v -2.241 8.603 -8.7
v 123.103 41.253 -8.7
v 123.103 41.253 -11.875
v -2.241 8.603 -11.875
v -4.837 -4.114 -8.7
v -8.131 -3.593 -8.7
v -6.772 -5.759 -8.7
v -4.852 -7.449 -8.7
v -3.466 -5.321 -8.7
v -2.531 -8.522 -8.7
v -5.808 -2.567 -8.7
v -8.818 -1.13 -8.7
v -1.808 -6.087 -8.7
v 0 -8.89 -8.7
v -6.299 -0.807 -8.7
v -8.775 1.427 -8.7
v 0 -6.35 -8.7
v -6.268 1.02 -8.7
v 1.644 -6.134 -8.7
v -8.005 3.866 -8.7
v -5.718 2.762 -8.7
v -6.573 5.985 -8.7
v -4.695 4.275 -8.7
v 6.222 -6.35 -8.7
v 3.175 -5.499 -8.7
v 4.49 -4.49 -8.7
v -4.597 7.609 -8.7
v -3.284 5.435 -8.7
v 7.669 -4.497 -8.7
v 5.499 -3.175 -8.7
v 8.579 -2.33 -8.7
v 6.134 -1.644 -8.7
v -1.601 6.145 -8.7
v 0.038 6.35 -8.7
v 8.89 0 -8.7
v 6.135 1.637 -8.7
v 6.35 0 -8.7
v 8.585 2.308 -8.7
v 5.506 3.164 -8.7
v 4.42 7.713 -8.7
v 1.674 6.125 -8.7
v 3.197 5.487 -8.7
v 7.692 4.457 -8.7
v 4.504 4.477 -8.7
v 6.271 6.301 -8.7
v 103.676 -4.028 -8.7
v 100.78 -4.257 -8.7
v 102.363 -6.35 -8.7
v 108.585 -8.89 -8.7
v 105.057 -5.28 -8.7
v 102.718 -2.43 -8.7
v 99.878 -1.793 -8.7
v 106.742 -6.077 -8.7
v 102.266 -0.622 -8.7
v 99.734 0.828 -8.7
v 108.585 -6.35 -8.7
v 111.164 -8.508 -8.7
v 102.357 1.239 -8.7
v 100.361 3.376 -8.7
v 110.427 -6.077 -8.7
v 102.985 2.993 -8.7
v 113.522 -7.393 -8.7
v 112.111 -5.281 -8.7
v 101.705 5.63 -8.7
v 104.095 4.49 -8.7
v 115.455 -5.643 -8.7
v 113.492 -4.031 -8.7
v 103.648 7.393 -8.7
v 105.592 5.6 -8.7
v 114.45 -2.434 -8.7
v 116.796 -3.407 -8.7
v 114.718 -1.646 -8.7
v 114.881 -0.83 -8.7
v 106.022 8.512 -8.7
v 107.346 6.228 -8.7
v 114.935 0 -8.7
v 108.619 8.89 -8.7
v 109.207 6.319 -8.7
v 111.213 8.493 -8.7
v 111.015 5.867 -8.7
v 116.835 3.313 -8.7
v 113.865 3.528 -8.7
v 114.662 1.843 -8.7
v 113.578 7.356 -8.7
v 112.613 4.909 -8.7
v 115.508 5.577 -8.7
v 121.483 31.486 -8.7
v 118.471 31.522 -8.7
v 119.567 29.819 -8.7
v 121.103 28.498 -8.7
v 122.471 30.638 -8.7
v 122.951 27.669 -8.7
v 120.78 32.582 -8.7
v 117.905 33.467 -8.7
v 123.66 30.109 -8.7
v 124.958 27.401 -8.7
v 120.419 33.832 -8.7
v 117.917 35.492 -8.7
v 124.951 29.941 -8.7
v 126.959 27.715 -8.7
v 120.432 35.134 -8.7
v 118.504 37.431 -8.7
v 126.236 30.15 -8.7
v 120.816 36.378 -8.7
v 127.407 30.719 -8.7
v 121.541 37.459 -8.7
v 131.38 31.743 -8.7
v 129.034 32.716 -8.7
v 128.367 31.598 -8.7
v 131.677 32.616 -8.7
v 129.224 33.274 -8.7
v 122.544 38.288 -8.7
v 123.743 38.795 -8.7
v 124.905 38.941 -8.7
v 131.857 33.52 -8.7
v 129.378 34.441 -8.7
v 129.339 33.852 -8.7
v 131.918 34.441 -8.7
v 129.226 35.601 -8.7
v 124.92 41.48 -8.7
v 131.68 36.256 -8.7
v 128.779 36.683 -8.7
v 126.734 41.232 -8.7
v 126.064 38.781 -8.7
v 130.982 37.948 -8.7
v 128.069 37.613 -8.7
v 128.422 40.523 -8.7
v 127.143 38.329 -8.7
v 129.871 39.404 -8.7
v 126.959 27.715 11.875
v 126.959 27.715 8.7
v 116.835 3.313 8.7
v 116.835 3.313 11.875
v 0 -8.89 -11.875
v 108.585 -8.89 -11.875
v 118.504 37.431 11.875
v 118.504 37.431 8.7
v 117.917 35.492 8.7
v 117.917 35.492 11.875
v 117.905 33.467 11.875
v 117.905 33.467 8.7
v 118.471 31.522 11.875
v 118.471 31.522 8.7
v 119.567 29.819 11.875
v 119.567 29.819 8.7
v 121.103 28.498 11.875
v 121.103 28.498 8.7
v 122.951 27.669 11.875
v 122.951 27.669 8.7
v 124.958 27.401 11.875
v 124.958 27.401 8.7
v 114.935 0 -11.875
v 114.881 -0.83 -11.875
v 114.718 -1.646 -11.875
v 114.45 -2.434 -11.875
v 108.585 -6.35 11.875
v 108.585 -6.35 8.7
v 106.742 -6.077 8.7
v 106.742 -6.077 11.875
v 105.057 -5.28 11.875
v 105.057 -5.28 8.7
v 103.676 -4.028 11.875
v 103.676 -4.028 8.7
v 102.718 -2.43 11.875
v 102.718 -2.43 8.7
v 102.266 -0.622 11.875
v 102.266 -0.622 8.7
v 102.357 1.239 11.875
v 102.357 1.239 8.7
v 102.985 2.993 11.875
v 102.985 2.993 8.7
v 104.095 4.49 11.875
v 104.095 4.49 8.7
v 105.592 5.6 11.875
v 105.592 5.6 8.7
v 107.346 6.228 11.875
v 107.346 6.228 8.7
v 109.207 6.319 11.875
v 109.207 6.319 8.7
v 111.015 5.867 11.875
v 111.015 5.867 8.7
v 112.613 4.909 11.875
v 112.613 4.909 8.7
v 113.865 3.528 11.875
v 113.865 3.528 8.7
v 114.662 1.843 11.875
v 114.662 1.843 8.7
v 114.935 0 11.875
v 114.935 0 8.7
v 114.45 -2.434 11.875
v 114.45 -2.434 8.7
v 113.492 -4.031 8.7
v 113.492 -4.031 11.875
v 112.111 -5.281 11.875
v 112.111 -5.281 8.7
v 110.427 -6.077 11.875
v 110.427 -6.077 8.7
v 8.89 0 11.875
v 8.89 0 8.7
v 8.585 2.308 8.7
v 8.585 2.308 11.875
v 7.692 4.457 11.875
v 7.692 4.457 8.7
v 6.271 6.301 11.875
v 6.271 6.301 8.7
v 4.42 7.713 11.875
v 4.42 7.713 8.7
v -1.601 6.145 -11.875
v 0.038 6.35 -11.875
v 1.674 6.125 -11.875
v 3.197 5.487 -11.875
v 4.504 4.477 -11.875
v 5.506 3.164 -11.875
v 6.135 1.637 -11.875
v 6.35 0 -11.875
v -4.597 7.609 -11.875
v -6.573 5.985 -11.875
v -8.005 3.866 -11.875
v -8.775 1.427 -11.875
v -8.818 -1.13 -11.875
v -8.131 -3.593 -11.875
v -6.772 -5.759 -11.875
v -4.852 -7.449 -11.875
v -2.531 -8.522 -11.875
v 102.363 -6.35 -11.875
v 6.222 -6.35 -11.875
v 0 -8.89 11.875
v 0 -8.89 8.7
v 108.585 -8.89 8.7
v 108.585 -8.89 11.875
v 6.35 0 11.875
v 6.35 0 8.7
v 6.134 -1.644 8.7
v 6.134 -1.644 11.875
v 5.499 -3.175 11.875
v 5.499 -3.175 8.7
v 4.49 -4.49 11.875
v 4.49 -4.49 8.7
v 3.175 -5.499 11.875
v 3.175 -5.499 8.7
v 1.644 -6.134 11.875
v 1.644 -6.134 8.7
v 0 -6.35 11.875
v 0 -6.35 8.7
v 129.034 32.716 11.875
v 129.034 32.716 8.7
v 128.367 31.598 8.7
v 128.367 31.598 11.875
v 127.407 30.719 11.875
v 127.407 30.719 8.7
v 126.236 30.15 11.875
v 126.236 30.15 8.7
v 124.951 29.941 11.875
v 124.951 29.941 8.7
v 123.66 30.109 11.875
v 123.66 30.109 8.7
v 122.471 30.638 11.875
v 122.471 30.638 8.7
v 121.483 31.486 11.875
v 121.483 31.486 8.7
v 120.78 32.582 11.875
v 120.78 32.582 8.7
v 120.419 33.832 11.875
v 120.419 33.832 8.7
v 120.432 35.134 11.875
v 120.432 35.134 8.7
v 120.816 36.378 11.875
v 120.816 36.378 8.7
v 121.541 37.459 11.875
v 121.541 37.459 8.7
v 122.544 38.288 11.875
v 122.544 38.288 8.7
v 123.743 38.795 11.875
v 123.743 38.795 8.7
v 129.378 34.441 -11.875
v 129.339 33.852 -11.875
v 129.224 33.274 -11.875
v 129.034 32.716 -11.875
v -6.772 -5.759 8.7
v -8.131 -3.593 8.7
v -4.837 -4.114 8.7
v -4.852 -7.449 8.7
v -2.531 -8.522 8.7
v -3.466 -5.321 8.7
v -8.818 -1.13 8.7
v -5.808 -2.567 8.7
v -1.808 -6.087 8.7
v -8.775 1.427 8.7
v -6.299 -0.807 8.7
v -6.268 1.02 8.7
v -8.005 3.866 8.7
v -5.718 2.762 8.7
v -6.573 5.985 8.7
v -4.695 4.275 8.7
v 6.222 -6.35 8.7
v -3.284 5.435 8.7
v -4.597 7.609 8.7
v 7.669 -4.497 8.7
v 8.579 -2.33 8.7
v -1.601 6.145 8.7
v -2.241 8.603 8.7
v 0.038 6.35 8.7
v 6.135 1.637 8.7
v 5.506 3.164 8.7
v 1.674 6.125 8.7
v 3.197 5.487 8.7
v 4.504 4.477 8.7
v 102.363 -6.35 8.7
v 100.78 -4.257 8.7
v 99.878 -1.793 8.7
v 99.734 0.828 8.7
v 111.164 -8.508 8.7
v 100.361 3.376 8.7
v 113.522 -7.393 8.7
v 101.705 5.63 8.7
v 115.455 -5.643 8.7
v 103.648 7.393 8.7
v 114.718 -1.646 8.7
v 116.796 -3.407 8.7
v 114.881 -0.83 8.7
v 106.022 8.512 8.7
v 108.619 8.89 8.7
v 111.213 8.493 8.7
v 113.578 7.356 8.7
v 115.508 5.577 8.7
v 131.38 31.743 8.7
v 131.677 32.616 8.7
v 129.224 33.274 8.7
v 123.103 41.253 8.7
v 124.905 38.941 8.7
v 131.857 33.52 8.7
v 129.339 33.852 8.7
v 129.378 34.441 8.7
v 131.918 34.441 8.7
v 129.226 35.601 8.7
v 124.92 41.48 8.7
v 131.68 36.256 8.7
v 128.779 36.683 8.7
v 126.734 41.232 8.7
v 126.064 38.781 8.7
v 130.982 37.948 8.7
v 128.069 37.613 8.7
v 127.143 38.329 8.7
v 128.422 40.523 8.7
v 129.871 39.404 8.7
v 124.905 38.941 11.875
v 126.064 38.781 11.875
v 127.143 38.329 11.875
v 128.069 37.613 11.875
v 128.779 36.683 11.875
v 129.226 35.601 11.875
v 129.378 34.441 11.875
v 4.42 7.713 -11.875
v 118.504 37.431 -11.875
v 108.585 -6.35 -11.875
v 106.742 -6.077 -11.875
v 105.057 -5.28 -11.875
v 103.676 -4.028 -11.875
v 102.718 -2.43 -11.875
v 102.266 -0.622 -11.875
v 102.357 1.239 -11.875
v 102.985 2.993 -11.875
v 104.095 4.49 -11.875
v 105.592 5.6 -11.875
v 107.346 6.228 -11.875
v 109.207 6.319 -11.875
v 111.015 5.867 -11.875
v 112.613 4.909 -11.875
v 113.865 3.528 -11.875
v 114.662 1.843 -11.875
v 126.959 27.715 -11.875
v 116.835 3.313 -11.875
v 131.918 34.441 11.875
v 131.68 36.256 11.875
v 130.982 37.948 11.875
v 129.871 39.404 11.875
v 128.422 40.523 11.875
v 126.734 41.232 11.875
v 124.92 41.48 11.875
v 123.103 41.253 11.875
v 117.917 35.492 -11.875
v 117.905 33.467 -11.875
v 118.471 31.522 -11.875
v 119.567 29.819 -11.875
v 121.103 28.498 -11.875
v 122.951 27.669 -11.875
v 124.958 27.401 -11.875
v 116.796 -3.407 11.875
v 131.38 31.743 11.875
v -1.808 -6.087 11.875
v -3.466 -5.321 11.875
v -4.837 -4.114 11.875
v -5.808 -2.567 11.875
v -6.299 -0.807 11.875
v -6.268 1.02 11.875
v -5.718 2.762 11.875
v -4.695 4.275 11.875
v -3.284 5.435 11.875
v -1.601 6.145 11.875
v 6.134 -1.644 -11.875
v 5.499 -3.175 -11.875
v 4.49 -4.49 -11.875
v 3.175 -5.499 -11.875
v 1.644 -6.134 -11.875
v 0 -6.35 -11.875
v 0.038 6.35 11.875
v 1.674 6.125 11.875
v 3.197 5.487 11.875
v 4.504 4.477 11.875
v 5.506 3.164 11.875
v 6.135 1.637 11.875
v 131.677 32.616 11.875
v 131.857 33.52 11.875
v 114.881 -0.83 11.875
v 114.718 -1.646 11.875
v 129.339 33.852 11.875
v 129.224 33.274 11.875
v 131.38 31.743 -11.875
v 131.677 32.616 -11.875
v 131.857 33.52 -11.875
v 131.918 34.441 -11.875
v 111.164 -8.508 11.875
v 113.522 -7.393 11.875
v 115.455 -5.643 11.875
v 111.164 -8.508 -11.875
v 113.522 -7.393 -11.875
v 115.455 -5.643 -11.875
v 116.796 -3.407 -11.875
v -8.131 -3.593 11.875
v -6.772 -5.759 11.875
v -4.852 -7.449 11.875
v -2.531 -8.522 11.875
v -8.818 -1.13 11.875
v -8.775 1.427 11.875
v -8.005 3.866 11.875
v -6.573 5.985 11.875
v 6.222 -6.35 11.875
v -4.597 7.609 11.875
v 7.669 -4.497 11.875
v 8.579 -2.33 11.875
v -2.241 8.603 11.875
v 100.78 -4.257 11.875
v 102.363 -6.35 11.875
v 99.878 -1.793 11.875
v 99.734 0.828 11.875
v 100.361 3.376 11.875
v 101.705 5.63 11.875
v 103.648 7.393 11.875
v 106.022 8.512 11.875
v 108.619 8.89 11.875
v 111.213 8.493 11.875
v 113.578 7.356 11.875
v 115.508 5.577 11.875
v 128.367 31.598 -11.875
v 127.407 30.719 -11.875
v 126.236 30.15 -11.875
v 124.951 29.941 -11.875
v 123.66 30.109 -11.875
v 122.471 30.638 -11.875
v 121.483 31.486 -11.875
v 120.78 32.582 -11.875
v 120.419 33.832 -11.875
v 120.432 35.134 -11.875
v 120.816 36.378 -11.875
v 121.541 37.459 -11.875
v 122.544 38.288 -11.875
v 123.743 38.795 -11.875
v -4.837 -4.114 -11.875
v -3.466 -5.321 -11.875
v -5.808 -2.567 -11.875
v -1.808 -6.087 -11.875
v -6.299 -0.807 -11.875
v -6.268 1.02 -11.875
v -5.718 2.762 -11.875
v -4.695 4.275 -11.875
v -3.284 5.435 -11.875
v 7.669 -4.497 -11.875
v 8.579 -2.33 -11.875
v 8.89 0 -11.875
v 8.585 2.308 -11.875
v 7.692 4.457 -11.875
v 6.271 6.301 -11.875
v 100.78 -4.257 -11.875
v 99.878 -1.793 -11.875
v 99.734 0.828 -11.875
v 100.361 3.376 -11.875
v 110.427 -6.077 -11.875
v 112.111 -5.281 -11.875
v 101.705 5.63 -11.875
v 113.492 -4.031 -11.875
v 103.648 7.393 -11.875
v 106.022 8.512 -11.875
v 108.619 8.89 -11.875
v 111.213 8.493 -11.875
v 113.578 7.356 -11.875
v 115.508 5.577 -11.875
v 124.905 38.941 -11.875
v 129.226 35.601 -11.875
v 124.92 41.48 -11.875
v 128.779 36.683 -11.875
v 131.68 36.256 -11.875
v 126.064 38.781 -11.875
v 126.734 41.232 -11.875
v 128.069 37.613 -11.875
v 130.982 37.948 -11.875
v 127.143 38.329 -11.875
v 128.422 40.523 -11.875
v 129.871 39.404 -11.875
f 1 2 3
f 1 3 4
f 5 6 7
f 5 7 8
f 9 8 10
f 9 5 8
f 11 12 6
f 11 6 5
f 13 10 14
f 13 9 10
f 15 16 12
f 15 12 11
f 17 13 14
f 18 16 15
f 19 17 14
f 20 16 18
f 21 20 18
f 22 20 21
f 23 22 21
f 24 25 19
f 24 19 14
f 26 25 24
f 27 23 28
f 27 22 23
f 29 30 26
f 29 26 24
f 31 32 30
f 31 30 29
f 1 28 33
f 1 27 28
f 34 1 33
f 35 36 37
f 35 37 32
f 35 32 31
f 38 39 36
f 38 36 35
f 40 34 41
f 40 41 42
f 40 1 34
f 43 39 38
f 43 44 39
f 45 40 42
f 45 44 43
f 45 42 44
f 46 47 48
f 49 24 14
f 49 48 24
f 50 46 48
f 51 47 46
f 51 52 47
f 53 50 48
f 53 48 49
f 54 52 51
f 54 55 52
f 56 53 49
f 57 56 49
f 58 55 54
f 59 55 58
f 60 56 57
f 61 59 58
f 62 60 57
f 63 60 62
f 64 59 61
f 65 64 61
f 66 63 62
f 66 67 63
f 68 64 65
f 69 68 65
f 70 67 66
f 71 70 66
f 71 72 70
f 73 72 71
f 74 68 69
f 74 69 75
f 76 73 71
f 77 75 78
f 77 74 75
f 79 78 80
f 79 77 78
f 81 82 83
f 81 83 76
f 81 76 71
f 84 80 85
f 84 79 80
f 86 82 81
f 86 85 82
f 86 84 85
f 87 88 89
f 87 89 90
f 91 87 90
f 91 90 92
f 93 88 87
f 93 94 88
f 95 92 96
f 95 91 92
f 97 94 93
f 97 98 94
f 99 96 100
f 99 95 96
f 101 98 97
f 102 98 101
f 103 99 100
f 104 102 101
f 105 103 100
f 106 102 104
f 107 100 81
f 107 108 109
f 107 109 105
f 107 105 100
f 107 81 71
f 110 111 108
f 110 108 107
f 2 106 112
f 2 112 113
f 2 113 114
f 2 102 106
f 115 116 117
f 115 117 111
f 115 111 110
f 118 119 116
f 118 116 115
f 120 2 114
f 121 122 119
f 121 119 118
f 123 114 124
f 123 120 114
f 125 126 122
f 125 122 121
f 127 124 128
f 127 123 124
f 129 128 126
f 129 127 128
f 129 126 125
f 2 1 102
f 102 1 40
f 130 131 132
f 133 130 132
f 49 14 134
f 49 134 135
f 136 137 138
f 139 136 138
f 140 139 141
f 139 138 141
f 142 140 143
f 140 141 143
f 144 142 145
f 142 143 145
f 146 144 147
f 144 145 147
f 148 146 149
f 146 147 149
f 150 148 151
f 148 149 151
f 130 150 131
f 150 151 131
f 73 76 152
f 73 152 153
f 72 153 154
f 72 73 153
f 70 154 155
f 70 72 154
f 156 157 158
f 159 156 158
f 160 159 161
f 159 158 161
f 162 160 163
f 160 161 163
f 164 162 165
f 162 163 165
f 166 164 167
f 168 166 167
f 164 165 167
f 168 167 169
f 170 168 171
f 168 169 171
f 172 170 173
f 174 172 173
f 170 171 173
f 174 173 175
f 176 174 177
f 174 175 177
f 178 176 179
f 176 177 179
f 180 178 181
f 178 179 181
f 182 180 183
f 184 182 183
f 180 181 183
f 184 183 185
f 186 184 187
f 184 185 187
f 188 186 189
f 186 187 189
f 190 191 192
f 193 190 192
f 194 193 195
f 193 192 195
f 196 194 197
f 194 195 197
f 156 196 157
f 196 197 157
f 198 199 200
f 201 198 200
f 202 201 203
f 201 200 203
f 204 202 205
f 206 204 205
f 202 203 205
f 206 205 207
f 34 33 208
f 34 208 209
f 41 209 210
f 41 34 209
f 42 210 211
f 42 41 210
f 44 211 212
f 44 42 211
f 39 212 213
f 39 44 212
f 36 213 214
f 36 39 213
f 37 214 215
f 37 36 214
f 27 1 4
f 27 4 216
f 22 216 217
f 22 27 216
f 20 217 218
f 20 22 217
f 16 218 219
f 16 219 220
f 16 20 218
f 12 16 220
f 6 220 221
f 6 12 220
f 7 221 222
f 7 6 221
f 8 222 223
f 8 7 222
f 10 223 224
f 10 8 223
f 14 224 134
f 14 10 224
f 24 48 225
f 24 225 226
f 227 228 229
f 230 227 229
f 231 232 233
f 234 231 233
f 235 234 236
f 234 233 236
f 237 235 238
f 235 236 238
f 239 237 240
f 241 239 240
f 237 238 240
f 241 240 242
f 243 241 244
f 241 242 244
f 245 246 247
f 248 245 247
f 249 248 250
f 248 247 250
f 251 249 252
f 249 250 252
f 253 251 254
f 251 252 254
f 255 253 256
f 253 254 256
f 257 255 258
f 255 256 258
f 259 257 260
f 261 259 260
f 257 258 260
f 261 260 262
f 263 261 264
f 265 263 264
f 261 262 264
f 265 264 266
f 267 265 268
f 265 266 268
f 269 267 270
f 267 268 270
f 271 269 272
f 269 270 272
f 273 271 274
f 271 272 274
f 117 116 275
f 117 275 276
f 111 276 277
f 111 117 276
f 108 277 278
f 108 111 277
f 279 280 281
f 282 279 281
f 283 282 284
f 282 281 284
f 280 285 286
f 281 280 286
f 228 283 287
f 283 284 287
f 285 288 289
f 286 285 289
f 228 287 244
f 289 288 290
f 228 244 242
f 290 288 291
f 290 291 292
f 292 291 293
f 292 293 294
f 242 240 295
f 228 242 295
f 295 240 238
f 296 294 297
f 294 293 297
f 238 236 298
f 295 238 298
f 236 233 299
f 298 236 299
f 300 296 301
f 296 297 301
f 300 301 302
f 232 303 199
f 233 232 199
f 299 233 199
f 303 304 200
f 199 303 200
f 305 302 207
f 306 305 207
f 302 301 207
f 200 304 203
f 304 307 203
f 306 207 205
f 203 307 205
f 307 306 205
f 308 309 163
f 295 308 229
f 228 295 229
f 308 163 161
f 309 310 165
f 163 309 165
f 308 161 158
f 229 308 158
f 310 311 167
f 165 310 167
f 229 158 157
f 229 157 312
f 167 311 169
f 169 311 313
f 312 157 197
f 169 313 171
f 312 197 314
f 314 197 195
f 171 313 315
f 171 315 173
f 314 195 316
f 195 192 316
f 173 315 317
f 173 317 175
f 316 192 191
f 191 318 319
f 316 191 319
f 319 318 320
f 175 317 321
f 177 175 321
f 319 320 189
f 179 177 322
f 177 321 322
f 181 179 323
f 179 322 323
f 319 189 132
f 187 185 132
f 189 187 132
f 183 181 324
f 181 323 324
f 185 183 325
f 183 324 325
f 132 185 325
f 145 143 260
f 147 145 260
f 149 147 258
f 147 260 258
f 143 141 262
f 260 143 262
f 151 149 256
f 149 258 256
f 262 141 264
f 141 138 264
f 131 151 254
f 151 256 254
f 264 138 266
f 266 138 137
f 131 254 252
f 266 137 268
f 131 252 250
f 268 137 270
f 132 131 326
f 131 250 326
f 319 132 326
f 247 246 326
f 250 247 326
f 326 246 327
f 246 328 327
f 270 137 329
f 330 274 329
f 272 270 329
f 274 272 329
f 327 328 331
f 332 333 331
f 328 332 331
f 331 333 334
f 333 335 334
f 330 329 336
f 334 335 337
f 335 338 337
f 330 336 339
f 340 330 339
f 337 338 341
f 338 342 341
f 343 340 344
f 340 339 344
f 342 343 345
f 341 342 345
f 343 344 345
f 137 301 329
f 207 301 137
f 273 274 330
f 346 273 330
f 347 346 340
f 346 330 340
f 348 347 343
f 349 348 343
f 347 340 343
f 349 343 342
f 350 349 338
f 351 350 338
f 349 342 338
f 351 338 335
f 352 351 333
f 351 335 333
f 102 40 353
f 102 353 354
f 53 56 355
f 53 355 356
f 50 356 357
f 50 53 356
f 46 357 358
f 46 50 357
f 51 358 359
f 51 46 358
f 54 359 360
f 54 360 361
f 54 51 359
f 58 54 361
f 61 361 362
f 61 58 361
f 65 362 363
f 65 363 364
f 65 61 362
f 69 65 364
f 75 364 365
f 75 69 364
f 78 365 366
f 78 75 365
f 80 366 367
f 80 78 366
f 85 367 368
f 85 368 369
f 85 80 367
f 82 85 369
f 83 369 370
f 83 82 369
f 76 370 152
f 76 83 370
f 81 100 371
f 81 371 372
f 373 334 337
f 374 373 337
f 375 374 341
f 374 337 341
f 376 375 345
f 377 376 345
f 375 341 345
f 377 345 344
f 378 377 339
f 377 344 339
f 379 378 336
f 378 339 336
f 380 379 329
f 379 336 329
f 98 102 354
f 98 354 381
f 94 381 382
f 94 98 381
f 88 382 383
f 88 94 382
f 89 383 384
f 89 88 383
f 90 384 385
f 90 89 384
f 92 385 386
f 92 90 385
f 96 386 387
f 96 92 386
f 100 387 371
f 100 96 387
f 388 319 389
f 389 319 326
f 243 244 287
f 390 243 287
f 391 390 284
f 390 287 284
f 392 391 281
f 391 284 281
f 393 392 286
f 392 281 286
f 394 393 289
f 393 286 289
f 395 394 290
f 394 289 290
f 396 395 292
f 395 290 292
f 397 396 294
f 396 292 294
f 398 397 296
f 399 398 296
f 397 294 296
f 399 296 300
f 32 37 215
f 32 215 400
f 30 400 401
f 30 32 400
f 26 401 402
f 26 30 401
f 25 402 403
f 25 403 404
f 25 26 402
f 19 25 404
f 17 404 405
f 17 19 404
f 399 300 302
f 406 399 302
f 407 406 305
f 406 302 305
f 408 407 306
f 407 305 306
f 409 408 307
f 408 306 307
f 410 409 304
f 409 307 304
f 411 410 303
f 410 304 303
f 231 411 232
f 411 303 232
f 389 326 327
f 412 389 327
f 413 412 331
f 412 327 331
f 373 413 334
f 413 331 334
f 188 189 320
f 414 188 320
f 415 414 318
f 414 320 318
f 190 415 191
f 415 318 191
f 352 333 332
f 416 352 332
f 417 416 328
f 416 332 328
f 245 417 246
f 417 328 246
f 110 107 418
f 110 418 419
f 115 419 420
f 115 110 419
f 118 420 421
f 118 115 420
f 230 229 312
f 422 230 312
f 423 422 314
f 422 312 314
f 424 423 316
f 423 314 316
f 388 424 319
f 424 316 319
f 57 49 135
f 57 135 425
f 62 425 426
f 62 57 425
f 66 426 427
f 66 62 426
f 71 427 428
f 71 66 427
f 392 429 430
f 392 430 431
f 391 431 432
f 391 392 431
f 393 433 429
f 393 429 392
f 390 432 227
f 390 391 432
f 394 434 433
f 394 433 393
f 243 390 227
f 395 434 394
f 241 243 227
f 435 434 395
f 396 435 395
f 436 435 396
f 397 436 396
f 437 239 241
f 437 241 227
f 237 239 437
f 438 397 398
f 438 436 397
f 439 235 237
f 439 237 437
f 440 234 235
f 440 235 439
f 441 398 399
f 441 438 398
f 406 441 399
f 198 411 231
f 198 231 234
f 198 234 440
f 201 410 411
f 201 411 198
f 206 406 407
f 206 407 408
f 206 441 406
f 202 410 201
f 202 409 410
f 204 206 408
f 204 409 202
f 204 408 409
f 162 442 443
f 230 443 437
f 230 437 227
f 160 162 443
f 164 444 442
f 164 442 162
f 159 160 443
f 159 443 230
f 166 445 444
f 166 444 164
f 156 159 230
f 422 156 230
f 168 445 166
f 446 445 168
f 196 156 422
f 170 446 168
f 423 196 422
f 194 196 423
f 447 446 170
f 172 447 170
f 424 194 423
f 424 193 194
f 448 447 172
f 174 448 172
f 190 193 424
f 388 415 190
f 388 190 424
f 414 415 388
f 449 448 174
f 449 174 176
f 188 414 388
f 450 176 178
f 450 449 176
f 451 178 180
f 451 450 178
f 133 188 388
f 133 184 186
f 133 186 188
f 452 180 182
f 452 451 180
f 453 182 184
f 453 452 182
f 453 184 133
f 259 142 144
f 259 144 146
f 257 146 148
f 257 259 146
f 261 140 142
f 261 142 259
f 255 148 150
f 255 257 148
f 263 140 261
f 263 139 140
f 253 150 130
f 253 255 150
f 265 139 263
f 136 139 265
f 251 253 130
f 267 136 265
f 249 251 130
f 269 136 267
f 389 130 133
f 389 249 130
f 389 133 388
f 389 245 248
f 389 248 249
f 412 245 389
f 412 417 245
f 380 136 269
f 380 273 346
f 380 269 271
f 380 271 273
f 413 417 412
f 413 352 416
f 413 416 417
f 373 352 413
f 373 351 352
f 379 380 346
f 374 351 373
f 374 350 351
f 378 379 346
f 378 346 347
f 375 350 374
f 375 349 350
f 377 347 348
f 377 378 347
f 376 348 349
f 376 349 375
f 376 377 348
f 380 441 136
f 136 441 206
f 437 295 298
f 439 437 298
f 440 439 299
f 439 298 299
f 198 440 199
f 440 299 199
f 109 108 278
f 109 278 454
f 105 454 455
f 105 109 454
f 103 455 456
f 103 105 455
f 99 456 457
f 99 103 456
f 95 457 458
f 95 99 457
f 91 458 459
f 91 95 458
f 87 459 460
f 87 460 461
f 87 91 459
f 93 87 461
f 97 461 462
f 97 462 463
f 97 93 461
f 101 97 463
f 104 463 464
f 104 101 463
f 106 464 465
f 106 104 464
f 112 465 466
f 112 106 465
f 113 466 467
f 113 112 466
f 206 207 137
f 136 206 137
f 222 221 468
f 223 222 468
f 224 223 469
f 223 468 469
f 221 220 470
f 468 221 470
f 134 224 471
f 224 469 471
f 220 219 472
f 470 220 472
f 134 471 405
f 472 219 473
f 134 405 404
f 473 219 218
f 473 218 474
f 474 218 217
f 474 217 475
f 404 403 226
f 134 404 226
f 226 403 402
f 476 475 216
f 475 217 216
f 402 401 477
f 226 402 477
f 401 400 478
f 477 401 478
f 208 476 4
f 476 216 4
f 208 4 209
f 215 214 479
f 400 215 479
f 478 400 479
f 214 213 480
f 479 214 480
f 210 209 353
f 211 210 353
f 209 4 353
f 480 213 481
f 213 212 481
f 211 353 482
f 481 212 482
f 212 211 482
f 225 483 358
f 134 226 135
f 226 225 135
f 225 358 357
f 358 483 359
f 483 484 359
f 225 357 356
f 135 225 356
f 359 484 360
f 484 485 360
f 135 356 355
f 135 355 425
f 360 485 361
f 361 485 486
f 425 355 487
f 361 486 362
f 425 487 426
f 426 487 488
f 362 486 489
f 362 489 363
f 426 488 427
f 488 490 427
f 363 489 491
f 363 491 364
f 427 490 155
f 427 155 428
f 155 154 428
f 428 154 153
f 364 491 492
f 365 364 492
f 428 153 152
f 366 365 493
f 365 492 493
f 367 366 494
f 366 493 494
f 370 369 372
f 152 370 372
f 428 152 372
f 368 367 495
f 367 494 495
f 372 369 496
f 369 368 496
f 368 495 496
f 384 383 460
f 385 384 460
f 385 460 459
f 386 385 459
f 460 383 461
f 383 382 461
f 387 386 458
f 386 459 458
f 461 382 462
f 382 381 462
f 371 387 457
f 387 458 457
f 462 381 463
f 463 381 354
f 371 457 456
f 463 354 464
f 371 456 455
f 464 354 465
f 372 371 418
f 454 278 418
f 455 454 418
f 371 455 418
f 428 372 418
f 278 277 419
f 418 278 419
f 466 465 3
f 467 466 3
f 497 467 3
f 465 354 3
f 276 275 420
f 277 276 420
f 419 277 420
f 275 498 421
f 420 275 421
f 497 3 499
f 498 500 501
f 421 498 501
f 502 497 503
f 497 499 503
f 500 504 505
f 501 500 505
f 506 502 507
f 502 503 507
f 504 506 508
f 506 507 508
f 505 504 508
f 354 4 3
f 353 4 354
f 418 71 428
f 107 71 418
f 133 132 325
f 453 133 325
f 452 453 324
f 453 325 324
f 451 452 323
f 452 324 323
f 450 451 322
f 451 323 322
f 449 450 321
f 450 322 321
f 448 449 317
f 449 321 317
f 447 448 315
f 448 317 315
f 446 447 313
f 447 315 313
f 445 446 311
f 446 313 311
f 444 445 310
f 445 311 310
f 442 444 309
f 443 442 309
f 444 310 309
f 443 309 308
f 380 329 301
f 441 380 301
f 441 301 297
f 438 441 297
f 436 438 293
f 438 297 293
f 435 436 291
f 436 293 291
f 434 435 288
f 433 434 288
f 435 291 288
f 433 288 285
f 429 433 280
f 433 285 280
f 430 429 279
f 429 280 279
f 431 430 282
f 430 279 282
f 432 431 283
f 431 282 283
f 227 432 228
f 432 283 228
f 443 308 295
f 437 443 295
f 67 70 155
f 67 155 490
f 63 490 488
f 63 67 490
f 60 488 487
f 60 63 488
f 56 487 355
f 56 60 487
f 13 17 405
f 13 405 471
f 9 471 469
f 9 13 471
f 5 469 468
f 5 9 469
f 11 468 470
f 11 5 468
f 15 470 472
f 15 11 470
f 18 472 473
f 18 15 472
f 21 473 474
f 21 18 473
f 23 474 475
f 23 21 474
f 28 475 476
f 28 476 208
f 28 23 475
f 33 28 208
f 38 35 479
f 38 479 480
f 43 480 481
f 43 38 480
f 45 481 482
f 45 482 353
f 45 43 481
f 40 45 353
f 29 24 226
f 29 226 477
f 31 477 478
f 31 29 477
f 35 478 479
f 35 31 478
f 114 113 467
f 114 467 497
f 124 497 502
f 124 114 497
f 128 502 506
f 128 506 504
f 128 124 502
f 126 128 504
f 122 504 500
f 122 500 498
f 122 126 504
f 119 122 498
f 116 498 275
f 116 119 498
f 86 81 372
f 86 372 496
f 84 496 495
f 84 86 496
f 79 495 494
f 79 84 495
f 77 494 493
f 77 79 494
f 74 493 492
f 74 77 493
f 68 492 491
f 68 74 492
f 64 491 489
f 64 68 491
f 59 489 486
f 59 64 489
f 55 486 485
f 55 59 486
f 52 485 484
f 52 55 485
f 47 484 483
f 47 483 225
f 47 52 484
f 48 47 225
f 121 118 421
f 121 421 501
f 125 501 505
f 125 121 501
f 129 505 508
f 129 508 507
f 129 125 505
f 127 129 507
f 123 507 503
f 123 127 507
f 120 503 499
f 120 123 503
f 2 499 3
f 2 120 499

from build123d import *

# Parameters (mm, degrees)
BOSS_EXTRUDE1_START = 8.6995
BOSS_EXTRUDE1_DEPTH = 3.175
BOSS_EXTRUDE2_START = -8.6995
BOSS_EXTRUDE2_DEPTH = 3.175


with BuildPart() as part:
    # Sketch1 → Boss-Extrude1 (new body)
    with BuildSketch(Plane.XY.offset(BOSS_EXTRUDE1_START)):
        with BuildLine():
            Line((123.103161211, 41.253277443), (-2.240939106, 8.602923452))
            ThreePointArc((-2.240939106, 8.602923452), (1.176892963, 8.811754817), (4.420121426, 7.713275995))
            Line((4.420121426, 7.713275995), (118.50424059, 37.43056517))
            ThreePointArc((118.50424059, 37.43056517), (120.377622543, 39.854515613), (123.103161211, 41.253277443))
        make_face()
        with BuildLine():
            ThreePointArc((4.420121426, 7.713275995), (1.176892963, 8.811754817), (-2.240939106, 8.602923452))
            ThreePointArc((-2.240939106, 8.602923452), (-8.817938804, -1.129626157), (0, -8.89))
            ThreePointArc((0, -8.89), (3.360104165, -8.230540687), (6.221703947, -6.35))
            Line((6.221703947, -6.35), (0, -6.35))
            ThreePointArc((0, -6.35), (-6.298527717, -0.806875827), (-1.60067079, 6.144945323))
            Line((-1.60067079, 6.144945323), (4.420121426, 7.713275995))
        make_face()
        with BuildLine():
            ThreePointArc((8.89, 0), (7.691780661, 4.45742193), (4.420121426, 7.713275995))
            Line((4.420121426, 7.713275995), (-1.60067079, 6.144945323))
            ThreePointArc((-1.60067079, 6.144945323), (3.883184292, 5.024279029), (6.35, 0))
            ThreePointArc((6.35, 0), (4.490128061, -4.490128061), (0, -6.35))
            Line((0, -6.35), (6.221703947, -6.35))
            ThreePointArc((6.221703947, -6.35), (8.195823573, -3.443918692), (8.89, 0))
        make_face()
        with BuildLine():
            ThreePointArc((6.221703947, -6.35), (3.360104165, -8.230540687), (0, -8.89))
            Line((0, -8.89), (108.585, -8.89))
            ThreePointArc((108.585, -8.89), (105.224895835, -8.230540687), (102.363296053, -6.35))
            Line((102.363296053, -6.35), (6.221703947, -6.35))
        make_face()
        with BuildLine():
            ThreePointArc((102.363296053, -6.35), (105.224895835, -8.230540687), (108.585, -8.89))
            ThreePointArc((108.585, -8.89), (113.521814689, -7.3932375), (116.796258377, -3.406954044))
            ThreePointArc((116.796258377, -3.406954044), (117.303663515, -1.736953227), (117.475, 0))
            ThreePointArc((117.475, 0), (117.313420536, 1.687238851), (116.834555694, 3.31314516))
            Line((116.834555694, 3.31314516), (114.450184555, -2.433538603))
            ThreePointArc((114.450184555, -2.433538603), (112.111296206, -5.280883928), (108.585, -6.35))
            Line((108.585, -6.35), (102.363296053, -6.35))
        make_face()
        with BuildLine():
            ThreePointArc((116.834555694, 3.31314516), (103.648185311, 7.3932375), (102.363296053, -6.35))
            Line((102.363296053, -6.35), (108.585, -6.35))
            ThreePointArc((108.585, -6.35), (104.094871939, 4.490128061), (114.935, 0))
            ThreePointArc((114.935, 0), (114.812616796, -1.240680876), (114.450184555, -2.433538603))
            Line((114.450184555, -2.433538603), (116.834555694, 3.31314516))
        make_face()
        with BuildLine():
            Line((116.796258377, -3.406954044), (131.38026698, 31.742643294))
            ThreePointArc((131.38026698, 31.742643294), (129.618686837, 29.236265213), (126.959354757, 27.715394219))
            Line((126.959354757, 27.715394219), (116.834555694, 3.31314516))
            ThreePointArc((116.834555694, 3.31314516), (117.313420536, 1.687238851), (117.475, 0))
            ThreePointArc((117.475, 0), (117.303663515, -1.736953227), (116.796258377, -3.406954044))
        make_face()
        with BuildLine():
            ThreePointArc((131.917763158, 34.440613651), (129.182899758, 40.01083796), (123.103161211, 41.253277443))
            ThreePointArc((123.103161211, 41.253277443), (120.377622543, 39.854515613), (118.50424059, 37.43056517))
            Line((118.50424059, 37.43056517), (123.743429527, 38.795299313))
            ThreePointArc((123.743429527, 38.795299313), (127.629626042, 38.001126349), (129.377763158, 34.440613651))
            ThreePointArc((129.377763158, 34.440613651), (129.291034903, 33.561390983), (129.034193158, 32.716058736))
            Line((129.034193158, 32.716058736), (126.959354757, 27.715394219))
            ThreePointArc((126.959354757, 27.715394219), (129.618686837, 29.236265213), (131.38026698, 31.742643294))
            ThreePointArc((131.38026698, 31.742643294), (131.782081622, 33.065118632), (131.917763158, 34.440613651))
        make_face()
        with BuildLine():
            Line((123.743429527, 38.795299313), (118.50424059, 37.43056517))
            ThreePointArc((118.50424059, 37.43056517), (119.567273114, 29.81889368), (126.959354757, 27.715394219))
            Line((126.959354757, 27.715394219), (129.034193158, 32.716058736))
            ThreePointArc((129.034193158, 32.716058736), (121.483273783, 31.486389238), (123.743429527, 38.795299313))
        make_face()
    extrude(amount=BOSS_EXTRUDE1_DEPTH)


with BuildPart() as body_2:
    # Sketch1<4> → Boss-Extrude2 (new body)
    with BuildSketch(Plane.XY.offset(BOSS_EXTRUDE2_START)):
        with BuildLine():
            Line((123.103161211, 41.253277443), (-2.240939106, 8.602923452))
            ThreePointArc((-2.240939106, 8.602923452), (1.176892963, 8.811754817), (4.420121426, 7.713275995))
            Line((4.420121426, 7.713275995), (118.50424059, 37.43056517))
            ThreePointArc((118.50424059, 37.43056517), (120.377622543, 39.854515613), (123.103161211, 41.253277443))
        make_face()
        with BuildLine():
            ThreePointArc((4.420121426, 7.713275995), (1.176892963, 8.811754817), (-2.240939106, 8.602923452))
            ThreePointArc((-2.240939106, 8.602923452), (-8.817938804, -1.129626157), (0, -8.89))
            ThreePointArc((0, -8.89), (3.360104165, -8.230540687), (6.221703947, -6.35))
            Line((6.221703947, -6.35), (0, -6.35))
            ThreePointArc((0, -6.35), (-6.298527717, -0.806875827), (-1.60067079, 6.144945323))
            Line((-1.60067079, 6.144945323), (4.420121426, 7.713275995))
        make_face()
        with BuildLine():
            ThreePointArc((8.89, 0), (7.691780661, 4.45742193), (4.420121426, 7.713275995))
            Line((4.420121426, 7.713275995), (-1.60067079, 6.144945323))
            ThreePointArc((-1.60067079, 6.144945323), (3.883184292, 5.024279029), (6.35, 0))
            ThreePointArc((6.35, 0), (4.490128061, -4.490128061), (0, -6.35))
            Line((0, -6.35), (6.221703947, -6.35))
            ThreePointArc((6.221703947, -6.35), (8.195823573, -3.443918692), (8.89, 0))
        make_face()
        with BuildLine():
            ThreePointArc((6.221703947, -6.35), (3.360104165, -8.230540687), (0, -8.89))
            Line((0, -8.89), (108.585, -8.89))
            ThreePointArc((108.585, -8.89), (105.224895835, -8.230540687), (102.363296053, -6.35))
            Line((102.363296053, -6.35), (6.221703947, -6.35))
        make_face()
        with BuildLine():
            ThreePointArc((102.363296053, -6.35), (105.224895835, -8.230540687), (108.585, -8.89))
            ThreePointArc((108.585, -8.89), (113.521814689, -7.3932375), (116.796258377, -3.406954044))
            ThreePointArc((116.796258377, -3.406954044), (117.303663515, -1.736953227), (117.475, 0))
            ThreePointArc((117.475, 0), (117.313420536, 1.687238851), (116.834555694, 3.31314516))
            Line((116.834555694, 3.31314516), (114.450184555, -2.433538603))
            ThreePointArc((114.450184555, -2.433538603), (112.111296206, -5.280883928), (108.585, -6.35))
            Line((108.585, -6.35), (102.363296053, -6.35))
        make_face()
        with BuildLine():
            ThreePointArc((116.834555694, 3.31314516), (103.648185311, 7.3932375), (102.363296053, -6.35))
            Line((102.363296053, -6.35), (108.585, -6.35))
            ThreePointArc((108.585, -6.35), (104.094871939, 4.490128061), (114.935, 0))
            ThreePointArc((114.935, 0), (114.812616796, -1.240680876), (114.450184555, -2.433538603))
            Line((114.450184555, -2.433538603), (116.834555694, 3.31314516))
        make_face()
        with BuildLine():
            Line((116.796258377, -3.406954044), (131.38026698, 31.742643294))
            ThreePointArc((131.38026698, 31.742643294), (129.618686837, 29.236265213), (126.959354757, 27.715394219))
            Line((126.959354757, 27.715394219), (116.834555694, 3.31314516))
            ThreePointArc((116.834555694, 3.31314516), (117.313420536, 1.687238851), (117.475, 0))
            ThreePointArc((117.475, 0), (117.303663515, -1.736953227), (116.796258377, -3.406954044))
        make_face()
        with BuildLine():
            ThreePointArc((131.917763158, 34.440613651), (129.182899758, 40.01083796), (123.103161211, 41.253277443))
            ThreePointArc((123.103161211, 41.253277443), (120.377622543, 39.854515613), (118.50424059, 37.43056517))
            Line((118.50424059, 37.43056517), (123.743429527, 38.795299313))
            ThreePointArc((123.743429527, 38.795299313), (127.629626042, 38.001126349), (129.377763158, 34.440613651))
            ThreePointArc((129.377763158, 34.440613651), (129.291034903, 33.561390983), (129.034193158, 32.716058736))
            Line((129.034193158, 32.716058736), (126.959354757, 27.715394219))
            ThreePointArc((126.959354757, 27.715394219), (129.618686837, 29.236265213), (131.38026698, 31.742643294))
            ThreePointArc((131.38026698, 31.742643294), (131.782081622, 33.065118632), (131.917763158, 34.440613651))
        make_face()
        with BuildLine():
            Line((123.743429527, 38.795299313), (118.50424059, 37.43056517))
            ThreePointArc((118.50424059, 37.43056517), (119.567273114, 29.81889368), (126.959354757, 27.715394219))
            Line((126.959354757, 27.715394219), (129.034193158, 32.716058736))
            ThreePointArc((129.034193158, 32.716058736), (121.483273783, 31.486389238), (123.743429527, 38.795299313))
        make_face()
    extrude(amount=-BOSS_EXTRUDE2_DEPTH)


solid = Compound([part.part, body_2.part])
